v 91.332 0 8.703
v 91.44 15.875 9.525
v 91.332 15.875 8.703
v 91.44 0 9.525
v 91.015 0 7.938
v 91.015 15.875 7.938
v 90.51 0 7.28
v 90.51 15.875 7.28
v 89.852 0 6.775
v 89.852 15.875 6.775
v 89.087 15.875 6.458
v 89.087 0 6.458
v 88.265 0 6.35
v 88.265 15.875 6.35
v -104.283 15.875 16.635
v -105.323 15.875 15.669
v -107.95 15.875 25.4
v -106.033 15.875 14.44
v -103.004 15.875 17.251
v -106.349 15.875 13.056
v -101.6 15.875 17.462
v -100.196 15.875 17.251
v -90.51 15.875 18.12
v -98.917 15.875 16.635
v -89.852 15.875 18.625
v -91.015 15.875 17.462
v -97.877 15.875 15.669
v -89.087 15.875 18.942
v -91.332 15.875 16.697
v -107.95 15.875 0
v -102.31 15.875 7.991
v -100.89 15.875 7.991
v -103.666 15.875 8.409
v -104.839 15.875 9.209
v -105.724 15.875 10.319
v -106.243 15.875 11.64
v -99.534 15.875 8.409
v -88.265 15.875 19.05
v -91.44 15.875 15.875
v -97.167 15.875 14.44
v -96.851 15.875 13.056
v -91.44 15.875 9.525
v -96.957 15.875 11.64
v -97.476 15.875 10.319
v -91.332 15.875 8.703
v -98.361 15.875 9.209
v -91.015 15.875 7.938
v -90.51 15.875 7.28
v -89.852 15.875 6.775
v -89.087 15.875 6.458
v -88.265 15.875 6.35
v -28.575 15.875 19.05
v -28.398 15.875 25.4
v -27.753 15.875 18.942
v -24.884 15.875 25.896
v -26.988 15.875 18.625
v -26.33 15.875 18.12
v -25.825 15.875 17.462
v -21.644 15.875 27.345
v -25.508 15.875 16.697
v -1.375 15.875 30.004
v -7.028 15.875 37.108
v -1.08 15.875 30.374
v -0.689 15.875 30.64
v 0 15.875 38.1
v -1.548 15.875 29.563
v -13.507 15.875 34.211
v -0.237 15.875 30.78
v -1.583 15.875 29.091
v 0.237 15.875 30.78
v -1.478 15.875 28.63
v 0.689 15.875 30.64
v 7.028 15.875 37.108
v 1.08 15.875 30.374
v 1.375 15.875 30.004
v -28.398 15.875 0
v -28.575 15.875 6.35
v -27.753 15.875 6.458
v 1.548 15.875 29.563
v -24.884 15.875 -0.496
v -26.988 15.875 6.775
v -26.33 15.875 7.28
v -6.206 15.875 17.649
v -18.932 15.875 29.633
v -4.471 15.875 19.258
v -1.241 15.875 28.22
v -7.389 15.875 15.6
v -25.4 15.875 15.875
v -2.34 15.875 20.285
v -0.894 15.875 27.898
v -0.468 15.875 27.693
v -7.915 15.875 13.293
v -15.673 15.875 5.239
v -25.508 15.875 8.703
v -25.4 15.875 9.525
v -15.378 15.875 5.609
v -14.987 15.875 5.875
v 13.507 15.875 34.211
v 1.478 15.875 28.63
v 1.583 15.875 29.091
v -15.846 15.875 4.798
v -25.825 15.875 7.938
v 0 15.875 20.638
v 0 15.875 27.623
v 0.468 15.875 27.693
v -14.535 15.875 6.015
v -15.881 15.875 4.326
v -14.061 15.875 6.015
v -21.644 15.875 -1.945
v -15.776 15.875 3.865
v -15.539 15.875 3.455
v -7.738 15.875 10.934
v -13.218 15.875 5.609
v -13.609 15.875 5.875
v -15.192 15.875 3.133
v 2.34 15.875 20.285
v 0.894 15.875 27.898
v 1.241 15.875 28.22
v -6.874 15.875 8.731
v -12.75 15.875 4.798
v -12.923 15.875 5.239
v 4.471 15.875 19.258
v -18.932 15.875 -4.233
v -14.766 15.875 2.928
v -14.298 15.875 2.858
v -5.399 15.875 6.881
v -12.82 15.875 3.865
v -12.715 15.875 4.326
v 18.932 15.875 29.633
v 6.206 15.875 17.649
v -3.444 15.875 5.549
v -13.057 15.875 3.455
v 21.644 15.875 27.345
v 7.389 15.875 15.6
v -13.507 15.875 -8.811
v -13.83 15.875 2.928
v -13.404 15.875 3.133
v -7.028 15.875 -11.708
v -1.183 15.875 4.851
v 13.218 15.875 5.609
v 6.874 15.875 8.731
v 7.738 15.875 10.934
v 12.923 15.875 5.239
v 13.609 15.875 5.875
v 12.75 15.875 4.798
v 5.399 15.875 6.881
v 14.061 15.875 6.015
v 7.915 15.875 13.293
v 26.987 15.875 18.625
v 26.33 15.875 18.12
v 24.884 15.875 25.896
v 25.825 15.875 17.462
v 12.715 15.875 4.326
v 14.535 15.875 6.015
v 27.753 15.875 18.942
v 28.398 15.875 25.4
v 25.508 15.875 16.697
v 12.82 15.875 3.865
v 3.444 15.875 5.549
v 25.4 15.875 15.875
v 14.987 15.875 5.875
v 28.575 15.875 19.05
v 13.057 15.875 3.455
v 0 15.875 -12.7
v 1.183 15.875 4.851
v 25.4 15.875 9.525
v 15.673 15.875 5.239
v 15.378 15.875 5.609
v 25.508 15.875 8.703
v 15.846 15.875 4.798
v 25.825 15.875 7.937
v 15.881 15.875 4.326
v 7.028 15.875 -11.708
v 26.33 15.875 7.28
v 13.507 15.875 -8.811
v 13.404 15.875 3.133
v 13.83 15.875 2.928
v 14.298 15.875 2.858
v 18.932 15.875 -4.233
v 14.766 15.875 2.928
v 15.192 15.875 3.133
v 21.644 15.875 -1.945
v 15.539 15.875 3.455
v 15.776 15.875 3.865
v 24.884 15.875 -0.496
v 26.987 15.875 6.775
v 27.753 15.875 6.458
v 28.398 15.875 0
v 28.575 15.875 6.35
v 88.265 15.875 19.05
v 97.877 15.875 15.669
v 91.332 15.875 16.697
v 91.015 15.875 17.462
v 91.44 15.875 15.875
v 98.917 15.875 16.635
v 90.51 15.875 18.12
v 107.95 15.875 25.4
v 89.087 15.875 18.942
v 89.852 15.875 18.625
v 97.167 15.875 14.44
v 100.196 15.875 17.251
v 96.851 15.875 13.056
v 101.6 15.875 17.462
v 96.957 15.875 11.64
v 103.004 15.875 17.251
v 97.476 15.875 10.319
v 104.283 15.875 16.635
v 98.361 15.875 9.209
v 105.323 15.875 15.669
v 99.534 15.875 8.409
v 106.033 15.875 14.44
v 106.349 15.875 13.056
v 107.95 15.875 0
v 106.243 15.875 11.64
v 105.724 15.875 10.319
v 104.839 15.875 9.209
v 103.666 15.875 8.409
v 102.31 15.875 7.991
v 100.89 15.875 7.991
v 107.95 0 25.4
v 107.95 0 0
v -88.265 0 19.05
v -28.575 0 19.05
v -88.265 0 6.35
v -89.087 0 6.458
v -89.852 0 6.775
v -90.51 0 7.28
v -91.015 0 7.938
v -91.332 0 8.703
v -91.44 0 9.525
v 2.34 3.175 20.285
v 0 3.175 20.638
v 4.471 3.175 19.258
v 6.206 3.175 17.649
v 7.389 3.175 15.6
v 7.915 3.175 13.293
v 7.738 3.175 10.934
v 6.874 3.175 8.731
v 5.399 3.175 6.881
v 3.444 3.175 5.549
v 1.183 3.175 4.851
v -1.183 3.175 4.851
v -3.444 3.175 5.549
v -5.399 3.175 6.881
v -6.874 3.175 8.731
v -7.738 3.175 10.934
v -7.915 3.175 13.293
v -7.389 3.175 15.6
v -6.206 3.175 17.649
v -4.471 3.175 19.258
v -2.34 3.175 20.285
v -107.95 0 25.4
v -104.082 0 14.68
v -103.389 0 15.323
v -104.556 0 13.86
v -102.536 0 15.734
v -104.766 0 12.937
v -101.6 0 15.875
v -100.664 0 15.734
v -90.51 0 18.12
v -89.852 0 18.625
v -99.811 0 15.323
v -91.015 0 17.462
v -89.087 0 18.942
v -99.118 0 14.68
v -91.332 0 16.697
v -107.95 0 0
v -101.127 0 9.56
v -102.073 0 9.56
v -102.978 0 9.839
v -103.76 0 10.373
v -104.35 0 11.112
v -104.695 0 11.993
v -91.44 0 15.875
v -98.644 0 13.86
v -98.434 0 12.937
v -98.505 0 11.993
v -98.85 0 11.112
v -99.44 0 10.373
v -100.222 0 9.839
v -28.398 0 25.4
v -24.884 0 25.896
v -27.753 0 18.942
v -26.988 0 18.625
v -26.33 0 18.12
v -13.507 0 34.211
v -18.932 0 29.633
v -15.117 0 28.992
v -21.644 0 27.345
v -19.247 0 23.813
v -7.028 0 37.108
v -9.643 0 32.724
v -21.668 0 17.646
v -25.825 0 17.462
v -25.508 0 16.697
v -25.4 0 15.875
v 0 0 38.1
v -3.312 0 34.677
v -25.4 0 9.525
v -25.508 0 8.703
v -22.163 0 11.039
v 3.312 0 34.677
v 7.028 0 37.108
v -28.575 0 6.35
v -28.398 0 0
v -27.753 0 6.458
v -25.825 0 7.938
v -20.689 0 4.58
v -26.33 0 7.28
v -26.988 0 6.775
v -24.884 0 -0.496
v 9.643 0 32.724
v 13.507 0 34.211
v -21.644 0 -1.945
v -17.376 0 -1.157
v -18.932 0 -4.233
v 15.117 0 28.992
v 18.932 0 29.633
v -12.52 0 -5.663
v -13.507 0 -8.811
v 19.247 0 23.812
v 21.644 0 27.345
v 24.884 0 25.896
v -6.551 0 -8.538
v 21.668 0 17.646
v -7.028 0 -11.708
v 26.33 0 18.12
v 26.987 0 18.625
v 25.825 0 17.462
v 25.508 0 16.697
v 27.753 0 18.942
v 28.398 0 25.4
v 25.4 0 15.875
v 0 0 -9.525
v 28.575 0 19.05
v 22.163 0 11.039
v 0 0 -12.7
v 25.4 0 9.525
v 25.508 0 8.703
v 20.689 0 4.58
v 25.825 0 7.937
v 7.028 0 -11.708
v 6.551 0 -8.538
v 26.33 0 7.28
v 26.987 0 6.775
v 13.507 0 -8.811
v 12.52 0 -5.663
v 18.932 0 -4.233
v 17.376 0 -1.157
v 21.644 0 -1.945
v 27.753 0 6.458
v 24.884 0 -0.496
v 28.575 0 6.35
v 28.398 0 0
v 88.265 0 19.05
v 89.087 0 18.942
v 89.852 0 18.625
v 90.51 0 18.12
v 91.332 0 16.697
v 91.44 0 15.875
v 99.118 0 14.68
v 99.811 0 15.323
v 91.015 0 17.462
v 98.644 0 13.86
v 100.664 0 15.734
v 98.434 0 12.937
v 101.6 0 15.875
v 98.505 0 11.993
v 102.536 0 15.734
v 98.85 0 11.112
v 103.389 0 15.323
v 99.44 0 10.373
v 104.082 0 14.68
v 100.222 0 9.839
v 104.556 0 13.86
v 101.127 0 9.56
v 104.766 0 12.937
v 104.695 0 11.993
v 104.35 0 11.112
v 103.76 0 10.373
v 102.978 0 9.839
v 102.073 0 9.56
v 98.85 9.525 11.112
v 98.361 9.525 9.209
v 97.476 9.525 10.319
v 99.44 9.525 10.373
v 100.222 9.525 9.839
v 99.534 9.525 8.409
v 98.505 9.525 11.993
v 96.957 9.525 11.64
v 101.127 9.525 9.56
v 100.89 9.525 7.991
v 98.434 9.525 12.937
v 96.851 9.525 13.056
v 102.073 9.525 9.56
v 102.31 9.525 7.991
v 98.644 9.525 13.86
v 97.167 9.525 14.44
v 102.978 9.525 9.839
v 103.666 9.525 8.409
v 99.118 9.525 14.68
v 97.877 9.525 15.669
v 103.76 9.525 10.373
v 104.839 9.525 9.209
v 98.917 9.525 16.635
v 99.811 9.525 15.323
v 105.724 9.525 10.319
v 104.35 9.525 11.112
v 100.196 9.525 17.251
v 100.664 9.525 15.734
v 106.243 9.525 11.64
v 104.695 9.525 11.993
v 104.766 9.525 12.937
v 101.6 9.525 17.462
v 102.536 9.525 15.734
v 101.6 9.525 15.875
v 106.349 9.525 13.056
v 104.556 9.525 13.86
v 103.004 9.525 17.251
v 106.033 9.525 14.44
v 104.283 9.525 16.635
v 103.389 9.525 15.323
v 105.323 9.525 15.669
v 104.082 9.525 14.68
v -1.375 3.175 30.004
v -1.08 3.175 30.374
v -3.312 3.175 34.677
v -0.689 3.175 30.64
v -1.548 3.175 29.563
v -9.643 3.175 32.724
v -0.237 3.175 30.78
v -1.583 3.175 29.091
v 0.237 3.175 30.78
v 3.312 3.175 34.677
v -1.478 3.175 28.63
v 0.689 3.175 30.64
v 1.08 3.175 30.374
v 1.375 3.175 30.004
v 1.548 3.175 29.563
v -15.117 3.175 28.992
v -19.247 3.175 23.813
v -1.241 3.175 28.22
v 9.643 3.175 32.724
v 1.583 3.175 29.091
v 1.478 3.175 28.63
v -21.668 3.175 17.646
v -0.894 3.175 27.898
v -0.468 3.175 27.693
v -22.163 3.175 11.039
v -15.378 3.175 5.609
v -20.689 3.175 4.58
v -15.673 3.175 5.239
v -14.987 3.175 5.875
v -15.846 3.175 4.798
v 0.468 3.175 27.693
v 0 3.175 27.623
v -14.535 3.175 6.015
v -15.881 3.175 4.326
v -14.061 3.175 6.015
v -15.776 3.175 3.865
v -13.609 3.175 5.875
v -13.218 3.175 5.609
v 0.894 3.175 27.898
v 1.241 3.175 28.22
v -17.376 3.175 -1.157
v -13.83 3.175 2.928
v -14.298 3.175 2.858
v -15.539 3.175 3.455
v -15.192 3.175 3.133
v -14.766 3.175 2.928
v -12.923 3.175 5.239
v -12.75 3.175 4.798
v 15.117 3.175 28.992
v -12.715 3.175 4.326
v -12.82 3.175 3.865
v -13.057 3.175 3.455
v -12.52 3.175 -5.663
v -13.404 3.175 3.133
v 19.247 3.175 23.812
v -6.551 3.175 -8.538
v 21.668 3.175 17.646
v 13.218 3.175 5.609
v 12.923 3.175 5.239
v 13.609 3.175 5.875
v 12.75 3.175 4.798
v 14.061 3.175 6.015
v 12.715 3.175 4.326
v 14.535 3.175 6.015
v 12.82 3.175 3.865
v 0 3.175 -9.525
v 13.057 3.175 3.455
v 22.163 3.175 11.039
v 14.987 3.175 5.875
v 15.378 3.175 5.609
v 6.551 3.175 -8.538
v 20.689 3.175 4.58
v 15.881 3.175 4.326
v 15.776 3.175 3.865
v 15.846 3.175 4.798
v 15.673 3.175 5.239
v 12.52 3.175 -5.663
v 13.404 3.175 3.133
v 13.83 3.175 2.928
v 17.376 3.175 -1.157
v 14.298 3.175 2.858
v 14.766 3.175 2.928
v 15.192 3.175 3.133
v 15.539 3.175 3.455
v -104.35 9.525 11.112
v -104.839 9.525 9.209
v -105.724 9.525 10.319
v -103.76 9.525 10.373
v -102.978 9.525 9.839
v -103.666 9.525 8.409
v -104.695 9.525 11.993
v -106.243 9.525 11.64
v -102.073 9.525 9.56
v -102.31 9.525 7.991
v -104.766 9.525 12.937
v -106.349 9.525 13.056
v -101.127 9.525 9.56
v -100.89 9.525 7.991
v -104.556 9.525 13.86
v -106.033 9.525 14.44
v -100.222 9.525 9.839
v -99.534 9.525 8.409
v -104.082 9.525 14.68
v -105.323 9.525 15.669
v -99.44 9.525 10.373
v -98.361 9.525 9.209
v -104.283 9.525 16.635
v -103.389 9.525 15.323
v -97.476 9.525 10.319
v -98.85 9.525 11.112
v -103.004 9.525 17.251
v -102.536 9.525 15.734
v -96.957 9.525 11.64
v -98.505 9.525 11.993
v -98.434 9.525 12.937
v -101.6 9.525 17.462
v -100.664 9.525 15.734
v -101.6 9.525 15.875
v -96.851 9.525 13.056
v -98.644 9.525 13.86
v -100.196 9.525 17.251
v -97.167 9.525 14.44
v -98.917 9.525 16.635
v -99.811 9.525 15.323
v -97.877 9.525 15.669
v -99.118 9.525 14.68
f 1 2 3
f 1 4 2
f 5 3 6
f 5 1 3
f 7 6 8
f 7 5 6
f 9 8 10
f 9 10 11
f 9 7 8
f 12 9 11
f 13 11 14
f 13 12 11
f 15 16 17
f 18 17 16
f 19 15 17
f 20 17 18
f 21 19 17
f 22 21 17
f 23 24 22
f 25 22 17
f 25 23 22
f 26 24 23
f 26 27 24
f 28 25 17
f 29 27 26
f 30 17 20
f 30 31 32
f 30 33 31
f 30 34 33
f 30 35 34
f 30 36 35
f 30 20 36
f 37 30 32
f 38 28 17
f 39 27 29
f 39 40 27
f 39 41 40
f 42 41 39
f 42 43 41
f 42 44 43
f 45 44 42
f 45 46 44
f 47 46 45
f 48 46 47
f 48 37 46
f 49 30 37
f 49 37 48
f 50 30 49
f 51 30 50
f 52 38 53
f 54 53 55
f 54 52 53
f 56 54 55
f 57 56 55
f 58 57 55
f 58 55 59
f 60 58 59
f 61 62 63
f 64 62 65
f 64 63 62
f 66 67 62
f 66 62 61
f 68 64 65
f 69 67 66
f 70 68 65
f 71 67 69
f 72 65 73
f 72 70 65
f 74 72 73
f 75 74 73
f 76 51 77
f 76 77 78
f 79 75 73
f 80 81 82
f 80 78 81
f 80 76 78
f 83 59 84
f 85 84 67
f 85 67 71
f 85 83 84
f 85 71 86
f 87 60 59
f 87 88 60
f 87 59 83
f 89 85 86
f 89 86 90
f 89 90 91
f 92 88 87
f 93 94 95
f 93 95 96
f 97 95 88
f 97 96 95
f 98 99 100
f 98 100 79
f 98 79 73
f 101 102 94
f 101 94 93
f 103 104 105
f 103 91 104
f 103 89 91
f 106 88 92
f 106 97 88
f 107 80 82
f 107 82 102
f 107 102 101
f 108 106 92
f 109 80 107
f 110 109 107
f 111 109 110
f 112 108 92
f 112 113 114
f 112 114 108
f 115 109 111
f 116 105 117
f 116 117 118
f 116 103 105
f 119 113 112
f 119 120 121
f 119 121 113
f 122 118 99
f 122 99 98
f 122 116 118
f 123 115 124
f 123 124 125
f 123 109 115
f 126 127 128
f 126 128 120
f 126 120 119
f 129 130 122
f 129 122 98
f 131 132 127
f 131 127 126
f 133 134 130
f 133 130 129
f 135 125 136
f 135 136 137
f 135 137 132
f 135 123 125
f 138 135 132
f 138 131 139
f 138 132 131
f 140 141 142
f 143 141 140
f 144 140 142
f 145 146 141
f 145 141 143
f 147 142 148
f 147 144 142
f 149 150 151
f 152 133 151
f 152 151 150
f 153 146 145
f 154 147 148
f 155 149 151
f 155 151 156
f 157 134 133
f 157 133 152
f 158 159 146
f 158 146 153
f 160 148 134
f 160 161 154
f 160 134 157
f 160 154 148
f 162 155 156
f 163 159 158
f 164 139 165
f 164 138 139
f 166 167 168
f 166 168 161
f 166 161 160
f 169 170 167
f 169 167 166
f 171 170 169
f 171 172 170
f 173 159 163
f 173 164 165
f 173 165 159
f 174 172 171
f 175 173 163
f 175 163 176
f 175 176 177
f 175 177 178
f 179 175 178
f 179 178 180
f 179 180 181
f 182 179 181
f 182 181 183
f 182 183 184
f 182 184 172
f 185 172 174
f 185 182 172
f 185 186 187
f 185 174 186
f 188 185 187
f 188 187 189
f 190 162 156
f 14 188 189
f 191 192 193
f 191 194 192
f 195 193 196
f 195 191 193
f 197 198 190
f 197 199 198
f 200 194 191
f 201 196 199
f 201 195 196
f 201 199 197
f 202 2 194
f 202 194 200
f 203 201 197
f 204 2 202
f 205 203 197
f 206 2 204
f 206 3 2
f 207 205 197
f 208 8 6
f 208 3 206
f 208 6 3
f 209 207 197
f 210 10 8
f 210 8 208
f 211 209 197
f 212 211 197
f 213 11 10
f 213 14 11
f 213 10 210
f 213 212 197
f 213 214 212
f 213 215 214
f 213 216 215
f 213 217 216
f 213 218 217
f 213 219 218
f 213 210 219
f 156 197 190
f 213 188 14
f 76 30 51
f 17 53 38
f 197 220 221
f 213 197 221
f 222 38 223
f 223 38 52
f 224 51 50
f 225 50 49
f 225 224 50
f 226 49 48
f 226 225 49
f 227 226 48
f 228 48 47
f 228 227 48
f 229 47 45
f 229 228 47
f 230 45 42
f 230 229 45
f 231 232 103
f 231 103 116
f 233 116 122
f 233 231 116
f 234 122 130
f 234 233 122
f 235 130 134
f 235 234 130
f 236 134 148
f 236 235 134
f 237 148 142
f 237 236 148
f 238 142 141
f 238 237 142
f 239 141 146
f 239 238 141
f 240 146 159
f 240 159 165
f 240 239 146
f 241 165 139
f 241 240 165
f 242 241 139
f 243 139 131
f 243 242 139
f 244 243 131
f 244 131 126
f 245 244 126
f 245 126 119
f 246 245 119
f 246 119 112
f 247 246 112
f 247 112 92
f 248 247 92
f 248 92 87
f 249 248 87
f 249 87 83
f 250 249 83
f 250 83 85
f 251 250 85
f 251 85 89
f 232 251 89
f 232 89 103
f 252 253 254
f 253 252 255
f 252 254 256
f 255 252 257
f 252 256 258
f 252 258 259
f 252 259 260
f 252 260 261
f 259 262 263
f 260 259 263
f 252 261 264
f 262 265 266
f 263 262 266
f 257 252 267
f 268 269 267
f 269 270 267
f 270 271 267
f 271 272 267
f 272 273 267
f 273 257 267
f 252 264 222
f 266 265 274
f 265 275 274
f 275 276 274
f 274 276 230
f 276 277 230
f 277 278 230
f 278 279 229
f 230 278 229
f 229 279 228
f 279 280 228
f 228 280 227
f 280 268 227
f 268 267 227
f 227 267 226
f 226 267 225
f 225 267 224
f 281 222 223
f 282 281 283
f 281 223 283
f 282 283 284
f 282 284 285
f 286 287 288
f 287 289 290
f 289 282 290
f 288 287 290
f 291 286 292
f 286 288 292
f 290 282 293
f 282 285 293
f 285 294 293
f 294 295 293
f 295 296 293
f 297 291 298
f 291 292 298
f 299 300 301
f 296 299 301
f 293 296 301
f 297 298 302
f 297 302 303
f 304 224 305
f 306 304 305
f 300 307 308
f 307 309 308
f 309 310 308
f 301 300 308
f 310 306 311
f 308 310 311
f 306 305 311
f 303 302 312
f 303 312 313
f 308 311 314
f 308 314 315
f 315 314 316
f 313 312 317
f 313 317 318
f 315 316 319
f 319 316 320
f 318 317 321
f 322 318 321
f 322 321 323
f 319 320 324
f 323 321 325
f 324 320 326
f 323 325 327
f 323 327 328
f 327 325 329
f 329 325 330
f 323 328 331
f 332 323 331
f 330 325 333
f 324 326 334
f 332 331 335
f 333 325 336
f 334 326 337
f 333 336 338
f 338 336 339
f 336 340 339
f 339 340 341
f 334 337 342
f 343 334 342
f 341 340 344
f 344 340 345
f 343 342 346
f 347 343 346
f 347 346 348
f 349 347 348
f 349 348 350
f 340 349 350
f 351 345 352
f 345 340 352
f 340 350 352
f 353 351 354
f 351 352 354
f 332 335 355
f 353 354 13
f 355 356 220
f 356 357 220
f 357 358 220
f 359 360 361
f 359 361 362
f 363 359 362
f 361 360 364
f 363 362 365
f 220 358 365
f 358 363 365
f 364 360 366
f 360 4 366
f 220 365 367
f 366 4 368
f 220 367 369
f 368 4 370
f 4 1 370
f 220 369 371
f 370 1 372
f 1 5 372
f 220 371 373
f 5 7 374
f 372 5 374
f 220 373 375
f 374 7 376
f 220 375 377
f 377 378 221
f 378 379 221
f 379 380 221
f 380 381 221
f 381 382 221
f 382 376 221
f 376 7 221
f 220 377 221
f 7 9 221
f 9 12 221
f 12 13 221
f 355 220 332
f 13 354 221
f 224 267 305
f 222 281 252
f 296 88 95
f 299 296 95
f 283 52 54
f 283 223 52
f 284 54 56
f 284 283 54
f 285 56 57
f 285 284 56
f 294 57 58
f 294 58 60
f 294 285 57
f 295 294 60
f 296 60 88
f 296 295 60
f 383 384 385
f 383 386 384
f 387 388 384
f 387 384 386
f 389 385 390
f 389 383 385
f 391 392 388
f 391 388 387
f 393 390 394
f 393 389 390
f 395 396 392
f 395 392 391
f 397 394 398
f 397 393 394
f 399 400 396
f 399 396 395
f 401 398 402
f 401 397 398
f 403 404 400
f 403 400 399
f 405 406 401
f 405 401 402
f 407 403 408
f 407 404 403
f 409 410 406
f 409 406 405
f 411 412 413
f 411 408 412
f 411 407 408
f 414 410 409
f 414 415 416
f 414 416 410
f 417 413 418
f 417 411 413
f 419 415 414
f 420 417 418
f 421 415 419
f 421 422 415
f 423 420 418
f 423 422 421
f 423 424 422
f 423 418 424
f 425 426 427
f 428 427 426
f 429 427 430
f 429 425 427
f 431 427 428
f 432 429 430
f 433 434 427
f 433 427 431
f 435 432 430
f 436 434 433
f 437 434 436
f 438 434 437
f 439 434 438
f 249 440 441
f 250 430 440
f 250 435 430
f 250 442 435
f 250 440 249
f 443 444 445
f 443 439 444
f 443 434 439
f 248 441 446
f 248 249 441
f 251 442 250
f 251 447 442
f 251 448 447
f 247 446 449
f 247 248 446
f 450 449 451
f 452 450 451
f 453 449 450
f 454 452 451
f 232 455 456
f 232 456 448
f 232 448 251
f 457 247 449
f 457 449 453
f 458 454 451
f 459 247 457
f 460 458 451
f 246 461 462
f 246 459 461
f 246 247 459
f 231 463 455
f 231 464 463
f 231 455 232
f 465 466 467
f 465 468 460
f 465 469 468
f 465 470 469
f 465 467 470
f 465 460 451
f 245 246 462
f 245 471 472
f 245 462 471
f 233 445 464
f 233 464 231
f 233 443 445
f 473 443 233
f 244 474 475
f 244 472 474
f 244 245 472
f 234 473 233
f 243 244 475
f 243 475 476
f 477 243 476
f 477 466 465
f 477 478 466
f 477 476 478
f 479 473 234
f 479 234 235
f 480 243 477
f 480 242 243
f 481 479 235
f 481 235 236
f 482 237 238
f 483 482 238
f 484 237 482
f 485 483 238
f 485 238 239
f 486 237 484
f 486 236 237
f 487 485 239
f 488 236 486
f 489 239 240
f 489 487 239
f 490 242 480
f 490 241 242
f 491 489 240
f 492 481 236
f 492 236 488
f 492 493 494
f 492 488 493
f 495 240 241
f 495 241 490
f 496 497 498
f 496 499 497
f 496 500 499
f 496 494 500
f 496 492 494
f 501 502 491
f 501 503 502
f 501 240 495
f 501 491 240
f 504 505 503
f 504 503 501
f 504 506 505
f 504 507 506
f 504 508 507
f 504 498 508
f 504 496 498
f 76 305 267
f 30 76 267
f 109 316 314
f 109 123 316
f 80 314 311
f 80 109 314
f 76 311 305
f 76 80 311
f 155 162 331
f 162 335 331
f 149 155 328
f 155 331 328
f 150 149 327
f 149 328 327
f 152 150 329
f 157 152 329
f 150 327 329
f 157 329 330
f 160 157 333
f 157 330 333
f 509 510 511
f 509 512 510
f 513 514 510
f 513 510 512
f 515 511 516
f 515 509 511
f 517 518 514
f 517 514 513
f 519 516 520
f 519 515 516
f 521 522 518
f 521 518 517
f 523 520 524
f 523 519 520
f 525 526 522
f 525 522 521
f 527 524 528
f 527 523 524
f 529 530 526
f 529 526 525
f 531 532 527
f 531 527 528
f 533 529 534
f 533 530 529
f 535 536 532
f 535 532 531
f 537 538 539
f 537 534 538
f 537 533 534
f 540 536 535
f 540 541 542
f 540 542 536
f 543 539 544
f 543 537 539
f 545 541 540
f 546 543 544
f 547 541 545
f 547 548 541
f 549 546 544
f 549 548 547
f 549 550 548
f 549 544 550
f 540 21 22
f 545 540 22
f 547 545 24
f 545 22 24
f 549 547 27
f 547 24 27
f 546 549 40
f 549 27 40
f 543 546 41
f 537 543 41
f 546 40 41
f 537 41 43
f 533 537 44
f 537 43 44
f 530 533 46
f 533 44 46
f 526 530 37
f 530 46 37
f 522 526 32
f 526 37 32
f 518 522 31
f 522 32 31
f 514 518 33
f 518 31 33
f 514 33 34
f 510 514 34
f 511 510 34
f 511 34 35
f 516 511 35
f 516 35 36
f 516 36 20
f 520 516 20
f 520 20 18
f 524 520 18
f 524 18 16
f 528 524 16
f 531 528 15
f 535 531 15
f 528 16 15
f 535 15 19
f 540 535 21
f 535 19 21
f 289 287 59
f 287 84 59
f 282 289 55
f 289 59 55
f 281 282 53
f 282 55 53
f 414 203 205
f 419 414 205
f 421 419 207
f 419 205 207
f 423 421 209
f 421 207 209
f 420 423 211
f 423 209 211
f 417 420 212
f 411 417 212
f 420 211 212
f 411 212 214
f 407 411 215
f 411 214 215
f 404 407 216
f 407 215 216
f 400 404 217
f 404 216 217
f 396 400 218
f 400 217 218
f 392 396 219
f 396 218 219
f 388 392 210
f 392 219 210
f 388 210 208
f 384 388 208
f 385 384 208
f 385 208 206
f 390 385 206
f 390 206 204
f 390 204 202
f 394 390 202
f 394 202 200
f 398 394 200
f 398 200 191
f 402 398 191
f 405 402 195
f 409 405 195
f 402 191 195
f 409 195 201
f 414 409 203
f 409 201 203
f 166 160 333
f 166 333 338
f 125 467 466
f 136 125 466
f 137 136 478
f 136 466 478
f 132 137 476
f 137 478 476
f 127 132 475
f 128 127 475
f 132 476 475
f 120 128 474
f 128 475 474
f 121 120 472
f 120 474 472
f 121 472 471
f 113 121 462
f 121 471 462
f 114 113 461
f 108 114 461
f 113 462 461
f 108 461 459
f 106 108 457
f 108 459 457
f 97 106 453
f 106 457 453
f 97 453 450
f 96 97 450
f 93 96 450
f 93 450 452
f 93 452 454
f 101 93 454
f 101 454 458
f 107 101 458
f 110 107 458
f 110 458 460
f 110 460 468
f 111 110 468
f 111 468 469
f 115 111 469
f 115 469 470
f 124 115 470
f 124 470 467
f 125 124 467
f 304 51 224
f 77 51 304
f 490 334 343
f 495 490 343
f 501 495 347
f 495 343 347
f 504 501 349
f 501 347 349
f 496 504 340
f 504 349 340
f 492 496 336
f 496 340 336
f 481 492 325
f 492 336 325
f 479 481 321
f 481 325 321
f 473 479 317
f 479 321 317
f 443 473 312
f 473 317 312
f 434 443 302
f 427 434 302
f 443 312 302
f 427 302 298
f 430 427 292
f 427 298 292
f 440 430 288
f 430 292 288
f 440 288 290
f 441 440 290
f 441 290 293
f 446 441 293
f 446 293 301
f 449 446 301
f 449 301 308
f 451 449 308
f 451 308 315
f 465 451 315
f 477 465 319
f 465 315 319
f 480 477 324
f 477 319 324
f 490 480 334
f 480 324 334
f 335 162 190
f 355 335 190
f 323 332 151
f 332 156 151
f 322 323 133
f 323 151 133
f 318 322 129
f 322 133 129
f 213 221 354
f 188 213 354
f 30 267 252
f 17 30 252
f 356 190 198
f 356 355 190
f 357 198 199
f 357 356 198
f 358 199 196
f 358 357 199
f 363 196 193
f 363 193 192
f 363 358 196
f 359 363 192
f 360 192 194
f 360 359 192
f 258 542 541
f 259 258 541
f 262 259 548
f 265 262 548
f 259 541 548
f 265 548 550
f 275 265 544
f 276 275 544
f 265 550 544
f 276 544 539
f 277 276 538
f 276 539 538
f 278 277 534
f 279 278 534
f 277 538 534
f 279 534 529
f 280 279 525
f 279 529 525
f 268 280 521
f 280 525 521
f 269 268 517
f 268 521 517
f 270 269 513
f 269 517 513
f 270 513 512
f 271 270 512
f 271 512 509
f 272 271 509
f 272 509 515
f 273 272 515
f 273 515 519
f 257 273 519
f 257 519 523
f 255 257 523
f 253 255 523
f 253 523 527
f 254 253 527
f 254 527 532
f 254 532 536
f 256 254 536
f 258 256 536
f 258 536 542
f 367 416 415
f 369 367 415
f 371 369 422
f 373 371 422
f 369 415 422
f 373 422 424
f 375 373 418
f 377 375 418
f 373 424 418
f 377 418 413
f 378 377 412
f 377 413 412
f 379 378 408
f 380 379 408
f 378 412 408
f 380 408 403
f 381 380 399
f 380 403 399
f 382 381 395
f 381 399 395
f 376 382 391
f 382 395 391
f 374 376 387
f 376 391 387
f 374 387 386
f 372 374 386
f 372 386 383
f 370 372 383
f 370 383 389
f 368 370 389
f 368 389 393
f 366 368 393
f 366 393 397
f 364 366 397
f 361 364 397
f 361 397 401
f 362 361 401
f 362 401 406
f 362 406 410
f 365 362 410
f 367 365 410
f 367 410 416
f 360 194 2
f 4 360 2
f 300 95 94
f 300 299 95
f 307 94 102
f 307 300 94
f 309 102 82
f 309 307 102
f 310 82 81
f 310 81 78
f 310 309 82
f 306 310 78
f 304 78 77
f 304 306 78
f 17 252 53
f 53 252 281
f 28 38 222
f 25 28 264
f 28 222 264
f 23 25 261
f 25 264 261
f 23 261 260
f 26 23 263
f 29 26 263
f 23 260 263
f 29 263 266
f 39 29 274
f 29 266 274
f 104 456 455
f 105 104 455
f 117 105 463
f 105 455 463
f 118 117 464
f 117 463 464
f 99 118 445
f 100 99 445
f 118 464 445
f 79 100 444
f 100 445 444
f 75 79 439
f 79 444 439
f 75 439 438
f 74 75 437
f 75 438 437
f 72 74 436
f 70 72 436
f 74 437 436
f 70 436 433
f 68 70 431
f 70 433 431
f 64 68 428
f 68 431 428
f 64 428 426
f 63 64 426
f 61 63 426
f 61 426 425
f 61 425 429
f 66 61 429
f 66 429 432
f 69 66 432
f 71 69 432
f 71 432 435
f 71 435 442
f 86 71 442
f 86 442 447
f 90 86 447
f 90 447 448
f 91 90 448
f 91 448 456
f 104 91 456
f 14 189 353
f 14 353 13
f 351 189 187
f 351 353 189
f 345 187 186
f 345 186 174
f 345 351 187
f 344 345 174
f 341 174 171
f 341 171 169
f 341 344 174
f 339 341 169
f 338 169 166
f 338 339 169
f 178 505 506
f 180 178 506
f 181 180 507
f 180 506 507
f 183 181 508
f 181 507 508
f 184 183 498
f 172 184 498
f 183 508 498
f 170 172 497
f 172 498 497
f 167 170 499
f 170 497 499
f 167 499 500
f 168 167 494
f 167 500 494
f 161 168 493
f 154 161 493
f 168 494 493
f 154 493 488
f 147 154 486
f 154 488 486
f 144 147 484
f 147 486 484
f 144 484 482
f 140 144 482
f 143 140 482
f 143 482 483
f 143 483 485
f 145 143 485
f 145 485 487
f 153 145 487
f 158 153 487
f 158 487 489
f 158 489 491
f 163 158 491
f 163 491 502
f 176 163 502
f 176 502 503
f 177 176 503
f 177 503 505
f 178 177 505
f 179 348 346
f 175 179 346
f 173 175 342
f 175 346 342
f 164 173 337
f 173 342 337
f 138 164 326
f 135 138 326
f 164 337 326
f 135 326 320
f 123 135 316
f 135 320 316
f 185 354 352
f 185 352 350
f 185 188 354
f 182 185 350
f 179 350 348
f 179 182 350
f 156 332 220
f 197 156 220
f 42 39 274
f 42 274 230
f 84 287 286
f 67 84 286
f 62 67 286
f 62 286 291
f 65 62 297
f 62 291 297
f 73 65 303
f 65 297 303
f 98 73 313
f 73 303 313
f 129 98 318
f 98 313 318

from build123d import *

# Parameters (mm, degrees)
SKETCH2_R           = 7.9375
BOSS_EXTRUDE1_DEPTH = 15.875
FILLET1_R           = 12.7
SKETCH3_R           = 22.225
CUT_EXTRUDE1_DEPTH  = 3.175
SKETCH4_R           = 4.7625
CUT_EXTRUDE2_DEPTH  = 6.35
SKETCH5_R           = 3.175
CUT_EXTRUDE3_DEPTH  = 115.871833471
SKETCH6_R           = 1.5875
CUT_EXTRUDE4_DEPTH  = 116.178567885
SKETCH7_W           = 66.04
SKETCH7_H           = 12.7
CUT_EXTRUDE5_DEPTH  = 116.571744492
FILLET2_R           = 3.175


with BuildPart() as part:
    # Sketch2 → Boss-Extrude1 (new body)
    # profile 1 of 5: a face of its own
    with BuildSketch(Plane(origin=(0, 0, 0), x_dir=(1, 0, 0), z_dir=(0, 1, 0))):
        with BuildLine():
            Line((-107.95, 0), (-107.95, -25.4))
            Line((-107.95, -25.4), (-21.997045256, -25.4))
            ThreePointArc((-21.997045256, -25.4), (-25.4, -12.7), (-21.997045256, 0))
            Line((-21.997045256, 0), (-107.95, 0))
        make_face()
    # profile 2 of 5: a face of its own
    with BuildSketch(Plane(origin=(0, 0, 0), x_dir=(1, 0, 0), z_dir=(0, 1, 0))):
        with BuildLine():
            ThreePointArc((-21.997045256, 0), (-25.4, -12.7), (-21.997045256, -25.4))
            Line((-21.997045256, -25.4), (-21.997045256, 0))
        make_face()
    # profile 3 of 5: a face of its own
    with BuildSketch(Plane(origin=(0, 0, 0), x_dir=(1, 0, 0), z_dir=(0, 1, 0))):
        with BuildLine():
            Line((-21.997045256, 0), (-21.997045256, -25.4))
            ThreePointArc((-21.997045256, -25.4), (0, -38.1), (21.997045256, -25.4))
            Line((21.997045256, -25.4), (21.997045256, 0))
            ThreePointArc((21.997045256, 0), (0, 12.7), (-21.997045256, 0))
        make_face()
        with Locations(Location((0, -12.7, 0), (0, 0, 270))):
            Circle(SKETCH2_R, mode=Mode.SUBTRACT)
    # profile 4 of 5: a face of its own
    with BuildSketch(Plane(origin=(0, 0, 0), x_dir=(1, 0, 0), z_dir=(0, 1, 0))):
        with BuildLine():
            Line((21.997045256, 0), (21.997045256, -25.4))
            ThreePointArc((21.997045256, -25.4), (24.534515988, -19.274003746), (25.4, -12.7))
            ThreePointArc((25.4, -12.7), (24.534515988, -6.125996254), (21.997045256, 0))
        make_face()
    # profile 5 of 5: a face of its own
    with BuildSketch(Plane(origin=(0, 0, 0), x_dir=(1, 0, 0), z_dir=(0, 1, 0))):
        with BuildLine():
            ThreePointArc((25.4, -12.7), (24.534515988, -19.274003746), (21.997045256, -25.4))
            Line((21.997045256, -25.4), (107.95, -25.4))
            Line((107.95, -25.4), (107.95, 0))
            Line((107.95, 0), (21.997045256, 0))
            ThreePointArc((21.997045256, 0), (24.534515988, -6.125996254), (25.4, -12.7))
        make_face()
    extrude(amount=BOSS_EXTRUDE1_DEPTH)

    # Fillet1
    fillet1_edges = [part.edges().sort_by_distance(p)[0] for p in [
        (-21.997045256, 7.9375, 0),
        (21.997045256, 7.9375, 0),
        (21.997045256, 7.9375, 25.4),
        (-21.997045256, 7.9375, 25.4),
    ]]
    fillet(fillet1_edges, radius=FILLET1_R)

    # Sketch3 → Cut-Extrude1 (cut)
    with BuildSketch(Plane.XZ):
        with Locations(Location((0, 12.7, 0), (0, 0, 270))):
            Circle(SKETCH3_R)
    extrude(amount=-CUT_EXTRUDE1_DEPTH, mode=Mode.SUBTRACT)

    # Sketch4 → Cut-Extrude2 (cut)
    with BuildSketch(Plane(origin=(0, 15.875, 0), x_dir=(1, 0, 0), z_dir=(0, 1, 0))):
        with Locations(Location((-101.6, -12.7, 0), (0, 0, 270))):
            Circle(SKETCH4_R)
        with Locations(Location((101.6, -12.7, 0), (0, 0, 270))):
            Circle(SKETCH4_R)
    extrude(amount=-CUT_EXTRUDE2_DEPTH, mode=Mode.SUBTRACT)

    # Sketch5 → Cut-Extrude3 (cut, through all)
    with BuildSketch(Plane(origin=(0, 9.525, 0), x_dir=(1, 0, 0), z_dir=(0, 1, 0))):
        with Locations(Location((-101.6, -12.7, 0), (0, 0, 270))):
            Circle(SKETCH5_R)
        with Locations(Location((101.6, -12.7, 0), (0, 0, 270))):
            Circle(SKETCH5_R)
    extrude(amount=-CUT_EXTRUDE3_DEPTH, mode=Mode.SUBTRACT)

    # Sketch6 → Cut-Extrude4 (cut, through all)
    with BuildSketch(Plane.XZ.offset(-3.175)):
        with Locations(Location((0, 29.21, 0), (0, 0, 270))):
            Circle(SKETCH6_R)
        with Locations(Location((14.298079416, 4.445, 0), (0, 0, 270))):
            Circle(SKETCH6_R)
        with Locations(Location((-14.298079416, 4.445, 0), (0, 0, 270))):
            Circle(SKETCH6_R)
    extrude(amount=-CUT_EXTRUDE4_DEPTH, mode=Mode.SUBTRACT)

    # Sketch7 → Cut-Extrude5 (cut, through all)
    with BuildSketch(Plane(origin=(0, 15.875, 0), x_dir=(1, 0, 0), z_dir=(0, 1, 0))):
        with Locations((-58.42, -12.7)):
            Rectangle(SKETCH7_W, SKETCH7_H)
        with Locations((58.42, -12.7)):
            Rectangle(SKETCH7_W, SKETCH7_H)
    extrude(amount=-CUT_EXTRUDE5_DEPTH, mode=Mode.SUBTRACT)

    # Fillet2
    fillet2_edges = [part.edges().sort_by_distance(p)[0] for p in [
        (-91.44, 7.9375, 19.05),
        (-91.44, 7.9375, 6.35),
        (-25.4, 7.9375, 6.35),
        (-25.4, 7.9375, 19.05),
        (25.4, 7.9375, 19.05),
        (25.4, 7.9375, 6.35),
        (91.44, 7.9375, 6.35),
        (91.44, 7.9375, 19.05),
    ]]
    fillet(fillet2_edges, radius=FILLET2_R)


solid = part.part
